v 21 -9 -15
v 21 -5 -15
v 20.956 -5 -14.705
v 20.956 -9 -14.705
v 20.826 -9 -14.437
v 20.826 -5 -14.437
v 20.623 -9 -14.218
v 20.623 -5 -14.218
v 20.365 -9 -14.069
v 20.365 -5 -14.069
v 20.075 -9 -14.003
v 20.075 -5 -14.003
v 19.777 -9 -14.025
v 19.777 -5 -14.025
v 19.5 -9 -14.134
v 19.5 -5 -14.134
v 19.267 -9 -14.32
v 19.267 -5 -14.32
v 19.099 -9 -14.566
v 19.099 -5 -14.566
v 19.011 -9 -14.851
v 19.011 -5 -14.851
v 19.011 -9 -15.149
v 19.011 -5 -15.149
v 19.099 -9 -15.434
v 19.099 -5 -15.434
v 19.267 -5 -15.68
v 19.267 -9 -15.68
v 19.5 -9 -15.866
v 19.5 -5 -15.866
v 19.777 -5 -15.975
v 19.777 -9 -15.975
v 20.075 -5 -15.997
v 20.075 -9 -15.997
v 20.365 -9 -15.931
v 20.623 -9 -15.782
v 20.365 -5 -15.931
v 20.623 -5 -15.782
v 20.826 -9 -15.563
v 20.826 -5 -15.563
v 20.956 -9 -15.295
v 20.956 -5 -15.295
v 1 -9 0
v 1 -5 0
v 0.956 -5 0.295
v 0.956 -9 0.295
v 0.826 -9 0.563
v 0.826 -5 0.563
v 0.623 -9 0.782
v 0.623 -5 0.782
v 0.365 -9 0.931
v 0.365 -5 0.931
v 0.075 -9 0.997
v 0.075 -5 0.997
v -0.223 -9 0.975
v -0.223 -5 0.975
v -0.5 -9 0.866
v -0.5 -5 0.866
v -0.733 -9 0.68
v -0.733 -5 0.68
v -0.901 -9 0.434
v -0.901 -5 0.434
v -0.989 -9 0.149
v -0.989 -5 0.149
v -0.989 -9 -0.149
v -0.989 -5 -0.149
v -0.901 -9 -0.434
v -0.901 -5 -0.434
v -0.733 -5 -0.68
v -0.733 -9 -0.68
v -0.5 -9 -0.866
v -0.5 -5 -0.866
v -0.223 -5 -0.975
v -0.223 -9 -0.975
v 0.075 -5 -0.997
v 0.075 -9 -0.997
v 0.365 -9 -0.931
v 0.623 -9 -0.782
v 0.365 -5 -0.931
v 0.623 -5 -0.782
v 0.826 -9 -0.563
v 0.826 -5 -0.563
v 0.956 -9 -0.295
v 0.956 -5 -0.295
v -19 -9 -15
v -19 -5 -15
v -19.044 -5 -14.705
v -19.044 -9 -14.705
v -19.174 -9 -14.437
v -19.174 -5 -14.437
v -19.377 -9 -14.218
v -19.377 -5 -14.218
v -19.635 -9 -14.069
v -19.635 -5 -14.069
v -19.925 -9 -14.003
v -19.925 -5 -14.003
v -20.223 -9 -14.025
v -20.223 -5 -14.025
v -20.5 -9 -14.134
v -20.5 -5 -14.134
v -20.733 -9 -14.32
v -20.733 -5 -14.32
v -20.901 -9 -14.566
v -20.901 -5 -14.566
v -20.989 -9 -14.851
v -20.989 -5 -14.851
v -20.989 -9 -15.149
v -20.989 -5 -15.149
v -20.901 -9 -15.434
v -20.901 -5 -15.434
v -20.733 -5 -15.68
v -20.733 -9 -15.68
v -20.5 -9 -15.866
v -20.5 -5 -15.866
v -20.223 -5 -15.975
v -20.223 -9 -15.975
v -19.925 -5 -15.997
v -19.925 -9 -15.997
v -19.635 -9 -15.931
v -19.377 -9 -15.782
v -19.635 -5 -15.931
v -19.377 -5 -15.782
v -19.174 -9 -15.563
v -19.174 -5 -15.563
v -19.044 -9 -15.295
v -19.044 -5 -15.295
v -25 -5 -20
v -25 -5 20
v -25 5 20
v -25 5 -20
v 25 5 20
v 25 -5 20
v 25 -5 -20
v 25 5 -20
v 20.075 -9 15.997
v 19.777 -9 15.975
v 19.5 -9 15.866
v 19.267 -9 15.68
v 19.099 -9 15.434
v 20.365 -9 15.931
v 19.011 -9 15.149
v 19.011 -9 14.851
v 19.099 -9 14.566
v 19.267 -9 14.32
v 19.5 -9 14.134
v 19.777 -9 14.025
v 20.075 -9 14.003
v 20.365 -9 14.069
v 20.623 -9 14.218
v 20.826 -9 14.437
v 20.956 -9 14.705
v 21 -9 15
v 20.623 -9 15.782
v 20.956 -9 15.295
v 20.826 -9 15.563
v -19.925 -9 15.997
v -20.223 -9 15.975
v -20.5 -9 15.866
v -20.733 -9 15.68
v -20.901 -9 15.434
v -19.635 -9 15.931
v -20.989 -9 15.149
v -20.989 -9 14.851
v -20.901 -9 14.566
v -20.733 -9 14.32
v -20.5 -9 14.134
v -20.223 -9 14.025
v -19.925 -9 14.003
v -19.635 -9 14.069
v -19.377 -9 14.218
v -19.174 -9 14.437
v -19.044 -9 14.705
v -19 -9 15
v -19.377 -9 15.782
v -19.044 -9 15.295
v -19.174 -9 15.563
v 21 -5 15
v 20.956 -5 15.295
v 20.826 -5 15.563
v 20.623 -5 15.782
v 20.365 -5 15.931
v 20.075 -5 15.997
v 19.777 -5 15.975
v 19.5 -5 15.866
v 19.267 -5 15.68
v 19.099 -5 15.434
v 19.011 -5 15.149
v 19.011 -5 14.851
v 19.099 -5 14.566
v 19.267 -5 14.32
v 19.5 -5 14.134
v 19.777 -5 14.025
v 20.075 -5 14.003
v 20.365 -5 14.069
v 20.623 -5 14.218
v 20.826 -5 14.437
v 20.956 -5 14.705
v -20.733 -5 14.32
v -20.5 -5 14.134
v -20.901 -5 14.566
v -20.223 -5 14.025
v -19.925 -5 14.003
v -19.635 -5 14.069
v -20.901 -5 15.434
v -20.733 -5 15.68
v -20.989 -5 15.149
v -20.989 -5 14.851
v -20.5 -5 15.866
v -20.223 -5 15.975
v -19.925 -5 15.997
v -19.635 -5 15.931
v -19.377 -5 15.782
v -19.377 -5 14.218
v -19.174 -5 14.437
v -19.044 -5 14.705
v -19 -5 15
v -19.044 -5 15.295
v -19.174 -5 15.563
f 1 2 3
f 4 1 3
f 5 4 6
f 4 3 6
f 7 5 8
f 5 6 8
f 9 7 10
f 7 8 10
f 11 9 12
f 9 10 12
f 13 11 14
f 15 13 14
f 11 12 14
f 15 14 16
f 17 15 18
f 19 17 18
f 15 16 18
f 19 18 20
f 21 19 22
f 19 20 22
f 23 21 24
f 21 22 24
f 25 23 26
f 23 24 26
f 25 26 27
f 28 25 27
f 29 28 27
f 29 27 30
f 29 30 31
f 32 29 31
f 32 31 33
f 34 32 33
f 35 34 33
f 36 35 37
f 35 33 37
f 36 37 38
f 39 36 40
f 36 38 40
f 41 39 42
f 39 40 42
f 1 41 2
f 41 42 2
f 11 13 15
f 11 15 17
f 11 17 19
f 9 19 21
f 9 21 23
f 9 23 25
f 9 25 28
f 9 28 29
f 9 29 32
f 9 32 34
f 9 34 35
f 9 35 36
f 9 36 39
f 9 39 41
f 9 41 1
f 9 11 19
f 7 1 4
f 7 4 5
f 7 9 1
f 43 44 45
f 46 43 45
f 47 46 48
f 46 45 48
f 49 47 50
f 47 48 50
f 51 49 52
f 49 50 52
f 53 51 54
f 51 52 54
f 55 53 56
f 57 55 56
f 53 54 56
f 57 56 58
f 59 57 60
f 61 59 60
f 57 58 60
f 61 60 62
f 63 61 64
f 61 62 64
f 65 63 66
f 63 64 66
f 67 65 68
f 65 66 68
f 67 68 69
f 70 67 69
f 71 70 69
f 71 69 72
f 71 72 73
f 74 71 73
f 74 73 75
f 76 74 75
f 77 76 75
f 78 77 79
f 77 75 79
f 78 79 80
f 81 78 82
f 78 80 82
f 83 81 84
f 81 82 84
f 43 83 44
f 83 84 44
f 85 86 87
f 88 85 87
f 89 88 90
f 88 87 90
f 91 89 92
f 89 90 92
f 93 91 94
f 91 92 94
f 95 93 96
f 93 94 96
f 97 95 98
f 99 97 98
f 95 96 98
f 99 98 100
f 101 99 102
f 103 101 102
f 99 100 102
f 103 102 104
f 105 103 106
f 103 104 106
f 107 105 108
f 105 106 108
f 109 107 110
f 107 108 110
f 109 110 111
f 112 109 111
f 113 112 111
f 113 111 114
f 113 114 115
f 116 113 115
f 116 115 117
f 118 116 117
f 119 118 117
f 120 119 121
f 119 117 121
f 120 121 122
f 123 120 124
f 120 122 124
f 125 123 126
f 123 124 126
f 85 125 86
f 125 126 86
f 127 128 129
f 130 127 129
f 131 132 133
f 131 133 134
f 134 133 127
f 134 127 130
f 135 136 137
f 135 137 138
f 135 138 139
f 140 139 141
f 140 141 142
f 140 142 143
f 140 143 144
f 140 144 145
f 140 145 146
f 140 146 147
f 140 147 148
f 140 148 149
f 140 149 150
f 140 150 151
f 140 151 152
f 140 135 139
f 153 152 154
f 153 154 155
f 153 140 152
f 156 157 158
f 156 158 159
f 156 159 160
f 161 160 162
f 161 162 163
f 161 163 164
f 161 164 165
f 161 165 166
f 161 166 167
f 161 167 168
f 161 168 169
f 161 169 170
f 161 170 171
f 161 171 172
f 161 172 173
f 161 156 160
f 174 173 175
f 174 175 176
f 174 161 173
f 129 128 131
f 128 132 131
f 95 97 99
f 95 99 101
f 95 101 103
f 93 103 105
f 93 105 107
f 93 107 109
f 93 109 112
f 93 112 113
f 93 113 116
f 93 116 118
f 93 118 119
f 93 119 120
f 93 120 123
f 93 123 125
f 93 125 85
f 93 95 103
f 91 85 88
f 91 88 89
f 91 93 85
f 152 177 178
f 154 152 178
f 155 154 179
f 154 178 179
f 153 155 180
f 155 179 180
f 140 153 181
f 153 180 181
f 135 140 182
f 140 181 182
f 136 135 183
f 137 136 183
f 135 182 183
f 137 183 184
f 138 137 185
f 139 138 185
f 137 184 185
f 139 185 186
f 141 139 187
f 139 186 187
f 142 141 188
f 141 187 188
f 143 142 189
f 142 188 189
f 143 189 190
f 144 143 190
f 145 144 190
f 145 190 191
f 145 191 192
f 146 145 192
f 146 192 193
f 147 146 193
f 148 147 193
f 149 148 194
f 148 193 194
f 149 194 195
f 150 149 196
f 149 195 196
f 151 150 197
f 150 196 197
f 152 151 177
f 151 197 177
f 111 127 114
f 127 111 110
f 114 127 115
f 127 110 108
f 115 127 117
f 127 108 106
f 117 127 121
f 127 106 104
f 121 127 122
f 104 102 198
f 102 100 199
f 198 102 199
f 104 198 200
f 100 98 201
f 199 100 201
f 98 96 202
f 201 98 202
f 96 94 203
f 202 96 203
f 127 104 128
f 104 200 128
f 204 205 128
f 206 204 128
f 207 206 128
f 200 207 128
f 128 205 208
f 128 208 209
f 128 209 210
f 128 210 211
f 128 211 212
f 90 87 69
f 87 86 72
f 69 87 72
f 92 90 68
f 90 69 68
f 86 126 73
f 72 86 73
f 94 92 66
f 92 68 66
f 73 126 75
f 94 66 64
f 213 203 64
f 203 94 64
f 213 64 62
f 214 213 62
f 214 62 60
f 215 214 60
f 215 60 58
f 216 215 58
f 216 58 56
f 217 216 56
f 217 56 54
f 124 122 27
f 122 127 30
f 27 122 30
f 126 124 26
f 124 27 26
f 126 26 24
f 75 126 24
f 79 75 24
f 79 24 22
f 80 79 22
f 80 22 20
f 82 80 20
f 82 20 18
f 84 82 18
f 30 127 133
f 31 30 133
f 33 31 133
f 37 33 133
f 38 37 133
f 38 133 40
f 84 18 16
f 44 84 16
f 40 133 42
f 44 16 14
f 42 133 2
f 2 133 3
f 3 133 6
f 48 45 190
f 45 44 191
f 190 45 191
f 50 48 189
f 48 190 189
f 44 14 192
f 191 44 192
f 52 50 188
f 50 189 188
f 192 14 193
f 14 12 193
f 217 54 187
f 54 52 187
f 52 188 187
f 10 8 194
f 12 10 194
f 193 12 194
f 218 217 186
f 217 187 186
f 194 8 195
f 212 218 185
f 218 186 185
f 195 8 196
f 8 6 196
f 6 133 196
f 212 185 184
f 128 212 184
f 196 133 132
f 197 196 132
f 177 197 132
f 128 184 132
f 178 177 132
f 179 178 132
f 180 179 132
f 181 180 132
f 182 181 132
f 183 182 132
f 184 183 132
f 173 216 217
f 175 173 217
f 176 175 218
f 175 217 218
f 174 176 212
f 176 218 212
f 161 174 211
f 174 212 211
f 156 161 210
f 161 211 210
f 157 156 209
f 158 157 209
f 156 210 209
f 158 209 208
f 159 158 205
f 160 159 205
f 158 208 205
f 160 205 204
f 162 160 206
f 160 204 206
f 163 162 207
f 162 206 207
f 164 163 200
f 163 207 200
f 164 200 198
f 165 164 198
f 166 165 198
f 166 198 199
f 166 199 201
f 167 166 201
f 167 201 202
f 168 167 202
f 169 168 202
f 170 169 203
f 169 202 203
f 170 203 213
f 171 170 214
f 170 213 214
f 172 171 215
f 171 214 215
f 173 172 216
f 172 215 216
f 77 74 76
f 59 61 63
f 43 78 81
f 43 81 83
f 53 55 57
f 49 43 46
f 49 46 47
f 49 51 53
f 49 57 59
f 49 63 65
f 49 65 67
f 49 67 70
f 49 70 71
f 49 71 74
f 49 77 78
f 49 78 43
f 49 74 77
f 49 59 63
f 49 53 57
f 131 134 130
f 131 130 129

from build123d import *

# Parameters (mm, degrees)
F0_W          = 10
F0_H          = 40
F1_DEPTH      = 25
F1_DEPTH_BACK = 25
F2_R          = 1
F3_DEPTH      = 4


with BuildPart() as f1:
    # F0 (on Right) → F1 (new body, two sides)
    with BuildSketch(Plane.YZ) as f1_sk:
        Rectangle(F0_W, F0_H)
    extrude(amount=F1_DEPTH)
    extrude(f1_sk.sketch, amount=-F1_DEPTH_BACK)

    # F2 (on face) → F3 (join)
    with BuildSketch(Plane.XZ.offset(5)):
        Circle(F2_R)
        with Locations((-20, 15)):
            Circle(F2_R)
        with Locations((-20, -15)):
            Circle(F2_R)
        with Locations((20, -15)):
            Circle(F2_R)
        with Locations((20, 15)):
            Circle(F2_R)
    extrude(amount=F3_DEPTH)


solid = f1.part
